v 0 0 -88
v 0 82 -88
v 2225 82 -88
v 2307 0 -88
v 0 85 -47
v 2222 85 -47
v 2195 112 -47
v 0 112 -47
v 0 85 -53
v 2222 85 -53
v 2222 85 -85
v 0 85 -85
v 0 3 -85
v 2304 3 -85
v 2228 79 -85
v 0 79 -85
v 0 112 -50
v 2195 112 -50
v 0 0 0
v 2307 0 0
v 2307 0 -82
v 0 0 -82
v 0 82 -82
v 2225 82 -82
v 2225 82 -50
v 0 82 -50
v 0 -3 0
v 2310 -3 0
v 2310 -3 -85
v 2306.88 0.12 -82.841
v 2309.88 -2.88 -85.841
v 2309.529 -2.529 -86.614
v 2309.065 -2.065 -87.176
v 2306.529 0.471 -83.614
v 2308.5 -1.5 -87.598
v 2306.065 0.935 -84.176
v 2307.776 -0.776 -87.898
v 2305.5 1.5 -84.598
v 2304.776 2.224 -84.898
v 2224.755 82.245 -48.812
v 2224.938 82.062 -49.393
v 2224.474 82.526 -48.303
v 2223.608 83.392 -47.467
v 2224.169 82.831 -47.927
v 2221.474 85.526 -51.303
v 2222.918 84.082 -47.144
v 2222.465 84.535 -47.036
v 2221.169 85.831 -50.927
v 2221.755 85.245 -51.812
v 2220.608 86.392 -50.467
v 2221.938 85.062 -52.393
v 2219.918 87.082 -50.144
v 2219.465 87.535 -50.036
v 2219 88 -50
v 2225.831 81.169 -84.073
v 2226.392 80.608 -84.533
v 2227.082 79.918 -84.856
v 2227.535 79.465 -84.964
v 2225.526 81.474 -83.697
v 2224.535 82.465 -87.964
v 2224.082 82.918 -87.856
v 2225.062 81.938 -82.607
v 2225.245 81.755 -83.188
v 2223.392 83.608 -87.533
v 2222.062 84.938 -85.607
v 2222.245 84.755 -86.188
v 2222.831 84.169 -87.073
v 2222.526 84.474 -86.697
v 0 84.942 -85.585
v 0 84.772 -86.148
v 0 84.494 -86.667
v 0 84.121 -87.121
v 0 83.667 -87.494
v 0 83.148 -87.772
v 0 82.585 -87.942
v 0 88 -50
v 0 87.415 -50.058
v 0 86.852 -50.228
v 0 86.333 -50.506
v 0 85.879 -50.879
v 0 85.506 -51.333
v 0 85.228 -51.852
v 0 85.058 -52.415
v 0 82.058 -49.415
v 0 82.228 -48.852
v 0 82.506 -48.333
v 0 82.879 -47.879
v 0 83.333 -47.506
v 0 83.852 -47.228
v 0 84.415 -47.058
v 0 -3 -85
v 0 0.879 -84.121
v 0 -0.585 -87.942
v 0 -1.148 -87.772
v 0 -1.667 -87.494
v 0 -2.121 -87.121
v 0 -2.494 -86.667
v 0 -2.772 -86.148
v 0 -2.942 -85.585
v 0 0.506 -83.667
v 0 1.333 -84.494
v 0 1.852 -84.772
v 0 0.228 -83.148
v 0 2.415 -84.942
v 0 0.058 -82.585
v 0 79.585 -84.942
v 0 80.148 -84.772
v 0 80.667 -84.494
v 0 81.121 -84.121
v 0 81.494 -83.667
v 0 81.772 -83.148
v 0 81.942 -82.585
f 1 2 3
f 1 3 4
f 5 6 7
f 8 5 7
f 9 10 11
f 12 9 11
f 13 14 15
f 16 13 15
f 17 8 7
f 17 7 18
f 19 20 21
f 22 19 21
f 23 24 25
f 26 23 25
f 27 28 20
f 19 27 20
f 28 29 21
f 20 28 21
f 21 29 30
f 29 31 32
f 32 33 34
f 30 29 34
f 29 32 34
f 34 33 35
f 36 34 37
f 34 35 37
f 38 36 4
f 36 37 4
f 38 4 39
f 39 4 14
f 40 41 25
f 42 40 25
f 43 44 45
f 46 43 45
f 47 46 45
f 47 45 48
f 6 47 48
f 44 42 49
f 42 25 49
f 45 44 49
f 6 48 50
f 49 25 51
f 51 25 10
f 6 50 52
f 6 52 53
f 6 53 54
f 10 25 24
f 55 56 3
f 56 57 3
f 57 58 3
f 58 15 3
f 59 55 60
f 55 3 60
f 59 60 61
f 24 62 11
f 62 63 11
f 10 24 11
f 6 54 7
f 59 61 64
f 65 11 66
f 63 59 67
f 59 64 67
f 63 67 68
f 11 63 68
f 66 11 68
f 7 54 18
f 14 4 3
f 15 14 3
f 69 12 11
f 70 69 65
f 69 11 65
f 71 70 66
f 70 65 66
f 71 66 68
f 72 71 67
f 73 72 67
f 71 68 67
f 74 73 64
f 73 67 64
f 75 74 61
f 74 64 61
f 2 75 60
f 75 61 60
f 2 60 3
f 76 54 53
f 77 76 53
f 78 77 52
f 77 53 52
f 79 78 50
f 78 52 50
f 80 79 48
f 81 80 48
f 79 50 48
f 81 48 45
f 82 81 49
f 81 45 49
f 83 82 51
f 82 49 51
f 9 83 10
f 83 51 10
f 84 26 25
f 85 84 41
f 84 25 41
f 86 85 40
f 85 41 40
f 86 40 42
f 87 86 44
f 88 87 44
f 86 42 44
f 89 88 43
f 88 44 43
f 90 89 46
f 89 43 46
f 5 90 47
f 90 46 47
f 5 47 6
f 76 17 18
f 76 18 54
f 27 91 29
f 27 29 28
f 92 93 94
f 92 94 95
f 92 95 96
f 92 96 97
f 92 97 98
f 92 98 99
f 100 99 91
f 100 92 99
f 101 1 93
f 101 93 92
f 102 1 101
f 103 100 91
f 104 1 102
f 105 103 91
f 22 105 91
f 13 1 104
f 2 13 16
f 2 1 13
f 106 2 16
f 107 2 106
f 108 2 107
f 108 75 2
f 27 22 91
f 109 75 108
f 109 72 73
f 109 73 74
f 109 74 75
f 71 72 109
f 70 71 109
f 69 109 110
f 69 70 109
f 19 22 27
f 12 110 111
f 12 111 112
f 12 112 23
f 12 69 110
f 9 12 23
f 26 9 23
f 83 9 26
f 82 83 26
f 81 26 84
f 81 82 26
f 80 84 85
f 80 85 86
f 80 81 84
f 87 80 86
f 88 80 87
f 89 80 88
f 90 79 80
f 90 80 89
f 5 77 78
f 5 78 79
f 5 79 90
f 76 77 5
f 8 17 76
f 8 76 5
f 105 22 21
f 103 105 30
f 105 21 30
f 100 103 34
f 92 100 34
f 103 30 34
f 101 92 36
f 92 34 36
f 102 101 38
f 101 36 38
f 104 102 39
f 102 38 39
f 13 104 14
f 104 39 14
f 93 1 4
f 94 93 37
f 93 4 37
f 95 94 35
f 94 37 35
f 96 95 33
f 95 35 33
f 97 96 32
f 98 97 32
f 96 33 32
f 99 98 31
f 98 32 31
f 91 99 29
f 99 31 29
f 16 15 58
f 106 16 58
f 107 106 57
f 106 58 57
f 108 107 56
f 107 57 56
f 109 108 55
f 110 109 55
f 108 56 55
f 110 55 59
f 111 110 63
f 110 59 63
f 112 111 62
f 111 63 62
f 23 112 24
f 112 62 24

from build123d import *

# Parameters (mm, degrees)
BOSS_EXTRUDE1_DEPTH = 2310
FILLET1_R           = 3
CUT_EXTRUDE1_DEPTH  = 88


with BuildPart() as part:
    # Sketch1 → Boss-Extrude1 (new body)
    with BuildSketch(Plane(origin=(0, 0, 0), x_dir=(0, 0, -1), z_dir=(1, 0, 0))):
        Polygon((0, 0), (85, 0), (85, 82), (47, 82), (47, 112), (50, 112), (50, 85), (88, 85), (88, -3), (0, -3), align=None)
    extrude(amount=BOSS_EXTRUDE1_DEPTH)

    # Fillet1
    fillet1_edges = [part.edges().sort_by_distance(p)[0] for p in [
        (1155, 0, -85),
        (1155, 82, -85),
        (1155, 82, -47),
        (1155, 85, -50),
        (1155, 85, -88),
        (1155, -3, -88),
    ]]
    fillet(fillet1_edges, radius=FILLET1_R)

    # Sketch4 → Cut-Extrude1 (cut)
    with BuildSketch(Plane(origin=(0, 0, -88), x_dir=(-1, 0, 0), z_dir=(0, 0, -1))):
        Polygon((-2310, -3), (-2195, 112), (-2310, 112), align=None)
    extrude(amount=-CUT_EXTRUDE1_DEPTH, mode=Mode.SUBTRACT)


solid = part.part
